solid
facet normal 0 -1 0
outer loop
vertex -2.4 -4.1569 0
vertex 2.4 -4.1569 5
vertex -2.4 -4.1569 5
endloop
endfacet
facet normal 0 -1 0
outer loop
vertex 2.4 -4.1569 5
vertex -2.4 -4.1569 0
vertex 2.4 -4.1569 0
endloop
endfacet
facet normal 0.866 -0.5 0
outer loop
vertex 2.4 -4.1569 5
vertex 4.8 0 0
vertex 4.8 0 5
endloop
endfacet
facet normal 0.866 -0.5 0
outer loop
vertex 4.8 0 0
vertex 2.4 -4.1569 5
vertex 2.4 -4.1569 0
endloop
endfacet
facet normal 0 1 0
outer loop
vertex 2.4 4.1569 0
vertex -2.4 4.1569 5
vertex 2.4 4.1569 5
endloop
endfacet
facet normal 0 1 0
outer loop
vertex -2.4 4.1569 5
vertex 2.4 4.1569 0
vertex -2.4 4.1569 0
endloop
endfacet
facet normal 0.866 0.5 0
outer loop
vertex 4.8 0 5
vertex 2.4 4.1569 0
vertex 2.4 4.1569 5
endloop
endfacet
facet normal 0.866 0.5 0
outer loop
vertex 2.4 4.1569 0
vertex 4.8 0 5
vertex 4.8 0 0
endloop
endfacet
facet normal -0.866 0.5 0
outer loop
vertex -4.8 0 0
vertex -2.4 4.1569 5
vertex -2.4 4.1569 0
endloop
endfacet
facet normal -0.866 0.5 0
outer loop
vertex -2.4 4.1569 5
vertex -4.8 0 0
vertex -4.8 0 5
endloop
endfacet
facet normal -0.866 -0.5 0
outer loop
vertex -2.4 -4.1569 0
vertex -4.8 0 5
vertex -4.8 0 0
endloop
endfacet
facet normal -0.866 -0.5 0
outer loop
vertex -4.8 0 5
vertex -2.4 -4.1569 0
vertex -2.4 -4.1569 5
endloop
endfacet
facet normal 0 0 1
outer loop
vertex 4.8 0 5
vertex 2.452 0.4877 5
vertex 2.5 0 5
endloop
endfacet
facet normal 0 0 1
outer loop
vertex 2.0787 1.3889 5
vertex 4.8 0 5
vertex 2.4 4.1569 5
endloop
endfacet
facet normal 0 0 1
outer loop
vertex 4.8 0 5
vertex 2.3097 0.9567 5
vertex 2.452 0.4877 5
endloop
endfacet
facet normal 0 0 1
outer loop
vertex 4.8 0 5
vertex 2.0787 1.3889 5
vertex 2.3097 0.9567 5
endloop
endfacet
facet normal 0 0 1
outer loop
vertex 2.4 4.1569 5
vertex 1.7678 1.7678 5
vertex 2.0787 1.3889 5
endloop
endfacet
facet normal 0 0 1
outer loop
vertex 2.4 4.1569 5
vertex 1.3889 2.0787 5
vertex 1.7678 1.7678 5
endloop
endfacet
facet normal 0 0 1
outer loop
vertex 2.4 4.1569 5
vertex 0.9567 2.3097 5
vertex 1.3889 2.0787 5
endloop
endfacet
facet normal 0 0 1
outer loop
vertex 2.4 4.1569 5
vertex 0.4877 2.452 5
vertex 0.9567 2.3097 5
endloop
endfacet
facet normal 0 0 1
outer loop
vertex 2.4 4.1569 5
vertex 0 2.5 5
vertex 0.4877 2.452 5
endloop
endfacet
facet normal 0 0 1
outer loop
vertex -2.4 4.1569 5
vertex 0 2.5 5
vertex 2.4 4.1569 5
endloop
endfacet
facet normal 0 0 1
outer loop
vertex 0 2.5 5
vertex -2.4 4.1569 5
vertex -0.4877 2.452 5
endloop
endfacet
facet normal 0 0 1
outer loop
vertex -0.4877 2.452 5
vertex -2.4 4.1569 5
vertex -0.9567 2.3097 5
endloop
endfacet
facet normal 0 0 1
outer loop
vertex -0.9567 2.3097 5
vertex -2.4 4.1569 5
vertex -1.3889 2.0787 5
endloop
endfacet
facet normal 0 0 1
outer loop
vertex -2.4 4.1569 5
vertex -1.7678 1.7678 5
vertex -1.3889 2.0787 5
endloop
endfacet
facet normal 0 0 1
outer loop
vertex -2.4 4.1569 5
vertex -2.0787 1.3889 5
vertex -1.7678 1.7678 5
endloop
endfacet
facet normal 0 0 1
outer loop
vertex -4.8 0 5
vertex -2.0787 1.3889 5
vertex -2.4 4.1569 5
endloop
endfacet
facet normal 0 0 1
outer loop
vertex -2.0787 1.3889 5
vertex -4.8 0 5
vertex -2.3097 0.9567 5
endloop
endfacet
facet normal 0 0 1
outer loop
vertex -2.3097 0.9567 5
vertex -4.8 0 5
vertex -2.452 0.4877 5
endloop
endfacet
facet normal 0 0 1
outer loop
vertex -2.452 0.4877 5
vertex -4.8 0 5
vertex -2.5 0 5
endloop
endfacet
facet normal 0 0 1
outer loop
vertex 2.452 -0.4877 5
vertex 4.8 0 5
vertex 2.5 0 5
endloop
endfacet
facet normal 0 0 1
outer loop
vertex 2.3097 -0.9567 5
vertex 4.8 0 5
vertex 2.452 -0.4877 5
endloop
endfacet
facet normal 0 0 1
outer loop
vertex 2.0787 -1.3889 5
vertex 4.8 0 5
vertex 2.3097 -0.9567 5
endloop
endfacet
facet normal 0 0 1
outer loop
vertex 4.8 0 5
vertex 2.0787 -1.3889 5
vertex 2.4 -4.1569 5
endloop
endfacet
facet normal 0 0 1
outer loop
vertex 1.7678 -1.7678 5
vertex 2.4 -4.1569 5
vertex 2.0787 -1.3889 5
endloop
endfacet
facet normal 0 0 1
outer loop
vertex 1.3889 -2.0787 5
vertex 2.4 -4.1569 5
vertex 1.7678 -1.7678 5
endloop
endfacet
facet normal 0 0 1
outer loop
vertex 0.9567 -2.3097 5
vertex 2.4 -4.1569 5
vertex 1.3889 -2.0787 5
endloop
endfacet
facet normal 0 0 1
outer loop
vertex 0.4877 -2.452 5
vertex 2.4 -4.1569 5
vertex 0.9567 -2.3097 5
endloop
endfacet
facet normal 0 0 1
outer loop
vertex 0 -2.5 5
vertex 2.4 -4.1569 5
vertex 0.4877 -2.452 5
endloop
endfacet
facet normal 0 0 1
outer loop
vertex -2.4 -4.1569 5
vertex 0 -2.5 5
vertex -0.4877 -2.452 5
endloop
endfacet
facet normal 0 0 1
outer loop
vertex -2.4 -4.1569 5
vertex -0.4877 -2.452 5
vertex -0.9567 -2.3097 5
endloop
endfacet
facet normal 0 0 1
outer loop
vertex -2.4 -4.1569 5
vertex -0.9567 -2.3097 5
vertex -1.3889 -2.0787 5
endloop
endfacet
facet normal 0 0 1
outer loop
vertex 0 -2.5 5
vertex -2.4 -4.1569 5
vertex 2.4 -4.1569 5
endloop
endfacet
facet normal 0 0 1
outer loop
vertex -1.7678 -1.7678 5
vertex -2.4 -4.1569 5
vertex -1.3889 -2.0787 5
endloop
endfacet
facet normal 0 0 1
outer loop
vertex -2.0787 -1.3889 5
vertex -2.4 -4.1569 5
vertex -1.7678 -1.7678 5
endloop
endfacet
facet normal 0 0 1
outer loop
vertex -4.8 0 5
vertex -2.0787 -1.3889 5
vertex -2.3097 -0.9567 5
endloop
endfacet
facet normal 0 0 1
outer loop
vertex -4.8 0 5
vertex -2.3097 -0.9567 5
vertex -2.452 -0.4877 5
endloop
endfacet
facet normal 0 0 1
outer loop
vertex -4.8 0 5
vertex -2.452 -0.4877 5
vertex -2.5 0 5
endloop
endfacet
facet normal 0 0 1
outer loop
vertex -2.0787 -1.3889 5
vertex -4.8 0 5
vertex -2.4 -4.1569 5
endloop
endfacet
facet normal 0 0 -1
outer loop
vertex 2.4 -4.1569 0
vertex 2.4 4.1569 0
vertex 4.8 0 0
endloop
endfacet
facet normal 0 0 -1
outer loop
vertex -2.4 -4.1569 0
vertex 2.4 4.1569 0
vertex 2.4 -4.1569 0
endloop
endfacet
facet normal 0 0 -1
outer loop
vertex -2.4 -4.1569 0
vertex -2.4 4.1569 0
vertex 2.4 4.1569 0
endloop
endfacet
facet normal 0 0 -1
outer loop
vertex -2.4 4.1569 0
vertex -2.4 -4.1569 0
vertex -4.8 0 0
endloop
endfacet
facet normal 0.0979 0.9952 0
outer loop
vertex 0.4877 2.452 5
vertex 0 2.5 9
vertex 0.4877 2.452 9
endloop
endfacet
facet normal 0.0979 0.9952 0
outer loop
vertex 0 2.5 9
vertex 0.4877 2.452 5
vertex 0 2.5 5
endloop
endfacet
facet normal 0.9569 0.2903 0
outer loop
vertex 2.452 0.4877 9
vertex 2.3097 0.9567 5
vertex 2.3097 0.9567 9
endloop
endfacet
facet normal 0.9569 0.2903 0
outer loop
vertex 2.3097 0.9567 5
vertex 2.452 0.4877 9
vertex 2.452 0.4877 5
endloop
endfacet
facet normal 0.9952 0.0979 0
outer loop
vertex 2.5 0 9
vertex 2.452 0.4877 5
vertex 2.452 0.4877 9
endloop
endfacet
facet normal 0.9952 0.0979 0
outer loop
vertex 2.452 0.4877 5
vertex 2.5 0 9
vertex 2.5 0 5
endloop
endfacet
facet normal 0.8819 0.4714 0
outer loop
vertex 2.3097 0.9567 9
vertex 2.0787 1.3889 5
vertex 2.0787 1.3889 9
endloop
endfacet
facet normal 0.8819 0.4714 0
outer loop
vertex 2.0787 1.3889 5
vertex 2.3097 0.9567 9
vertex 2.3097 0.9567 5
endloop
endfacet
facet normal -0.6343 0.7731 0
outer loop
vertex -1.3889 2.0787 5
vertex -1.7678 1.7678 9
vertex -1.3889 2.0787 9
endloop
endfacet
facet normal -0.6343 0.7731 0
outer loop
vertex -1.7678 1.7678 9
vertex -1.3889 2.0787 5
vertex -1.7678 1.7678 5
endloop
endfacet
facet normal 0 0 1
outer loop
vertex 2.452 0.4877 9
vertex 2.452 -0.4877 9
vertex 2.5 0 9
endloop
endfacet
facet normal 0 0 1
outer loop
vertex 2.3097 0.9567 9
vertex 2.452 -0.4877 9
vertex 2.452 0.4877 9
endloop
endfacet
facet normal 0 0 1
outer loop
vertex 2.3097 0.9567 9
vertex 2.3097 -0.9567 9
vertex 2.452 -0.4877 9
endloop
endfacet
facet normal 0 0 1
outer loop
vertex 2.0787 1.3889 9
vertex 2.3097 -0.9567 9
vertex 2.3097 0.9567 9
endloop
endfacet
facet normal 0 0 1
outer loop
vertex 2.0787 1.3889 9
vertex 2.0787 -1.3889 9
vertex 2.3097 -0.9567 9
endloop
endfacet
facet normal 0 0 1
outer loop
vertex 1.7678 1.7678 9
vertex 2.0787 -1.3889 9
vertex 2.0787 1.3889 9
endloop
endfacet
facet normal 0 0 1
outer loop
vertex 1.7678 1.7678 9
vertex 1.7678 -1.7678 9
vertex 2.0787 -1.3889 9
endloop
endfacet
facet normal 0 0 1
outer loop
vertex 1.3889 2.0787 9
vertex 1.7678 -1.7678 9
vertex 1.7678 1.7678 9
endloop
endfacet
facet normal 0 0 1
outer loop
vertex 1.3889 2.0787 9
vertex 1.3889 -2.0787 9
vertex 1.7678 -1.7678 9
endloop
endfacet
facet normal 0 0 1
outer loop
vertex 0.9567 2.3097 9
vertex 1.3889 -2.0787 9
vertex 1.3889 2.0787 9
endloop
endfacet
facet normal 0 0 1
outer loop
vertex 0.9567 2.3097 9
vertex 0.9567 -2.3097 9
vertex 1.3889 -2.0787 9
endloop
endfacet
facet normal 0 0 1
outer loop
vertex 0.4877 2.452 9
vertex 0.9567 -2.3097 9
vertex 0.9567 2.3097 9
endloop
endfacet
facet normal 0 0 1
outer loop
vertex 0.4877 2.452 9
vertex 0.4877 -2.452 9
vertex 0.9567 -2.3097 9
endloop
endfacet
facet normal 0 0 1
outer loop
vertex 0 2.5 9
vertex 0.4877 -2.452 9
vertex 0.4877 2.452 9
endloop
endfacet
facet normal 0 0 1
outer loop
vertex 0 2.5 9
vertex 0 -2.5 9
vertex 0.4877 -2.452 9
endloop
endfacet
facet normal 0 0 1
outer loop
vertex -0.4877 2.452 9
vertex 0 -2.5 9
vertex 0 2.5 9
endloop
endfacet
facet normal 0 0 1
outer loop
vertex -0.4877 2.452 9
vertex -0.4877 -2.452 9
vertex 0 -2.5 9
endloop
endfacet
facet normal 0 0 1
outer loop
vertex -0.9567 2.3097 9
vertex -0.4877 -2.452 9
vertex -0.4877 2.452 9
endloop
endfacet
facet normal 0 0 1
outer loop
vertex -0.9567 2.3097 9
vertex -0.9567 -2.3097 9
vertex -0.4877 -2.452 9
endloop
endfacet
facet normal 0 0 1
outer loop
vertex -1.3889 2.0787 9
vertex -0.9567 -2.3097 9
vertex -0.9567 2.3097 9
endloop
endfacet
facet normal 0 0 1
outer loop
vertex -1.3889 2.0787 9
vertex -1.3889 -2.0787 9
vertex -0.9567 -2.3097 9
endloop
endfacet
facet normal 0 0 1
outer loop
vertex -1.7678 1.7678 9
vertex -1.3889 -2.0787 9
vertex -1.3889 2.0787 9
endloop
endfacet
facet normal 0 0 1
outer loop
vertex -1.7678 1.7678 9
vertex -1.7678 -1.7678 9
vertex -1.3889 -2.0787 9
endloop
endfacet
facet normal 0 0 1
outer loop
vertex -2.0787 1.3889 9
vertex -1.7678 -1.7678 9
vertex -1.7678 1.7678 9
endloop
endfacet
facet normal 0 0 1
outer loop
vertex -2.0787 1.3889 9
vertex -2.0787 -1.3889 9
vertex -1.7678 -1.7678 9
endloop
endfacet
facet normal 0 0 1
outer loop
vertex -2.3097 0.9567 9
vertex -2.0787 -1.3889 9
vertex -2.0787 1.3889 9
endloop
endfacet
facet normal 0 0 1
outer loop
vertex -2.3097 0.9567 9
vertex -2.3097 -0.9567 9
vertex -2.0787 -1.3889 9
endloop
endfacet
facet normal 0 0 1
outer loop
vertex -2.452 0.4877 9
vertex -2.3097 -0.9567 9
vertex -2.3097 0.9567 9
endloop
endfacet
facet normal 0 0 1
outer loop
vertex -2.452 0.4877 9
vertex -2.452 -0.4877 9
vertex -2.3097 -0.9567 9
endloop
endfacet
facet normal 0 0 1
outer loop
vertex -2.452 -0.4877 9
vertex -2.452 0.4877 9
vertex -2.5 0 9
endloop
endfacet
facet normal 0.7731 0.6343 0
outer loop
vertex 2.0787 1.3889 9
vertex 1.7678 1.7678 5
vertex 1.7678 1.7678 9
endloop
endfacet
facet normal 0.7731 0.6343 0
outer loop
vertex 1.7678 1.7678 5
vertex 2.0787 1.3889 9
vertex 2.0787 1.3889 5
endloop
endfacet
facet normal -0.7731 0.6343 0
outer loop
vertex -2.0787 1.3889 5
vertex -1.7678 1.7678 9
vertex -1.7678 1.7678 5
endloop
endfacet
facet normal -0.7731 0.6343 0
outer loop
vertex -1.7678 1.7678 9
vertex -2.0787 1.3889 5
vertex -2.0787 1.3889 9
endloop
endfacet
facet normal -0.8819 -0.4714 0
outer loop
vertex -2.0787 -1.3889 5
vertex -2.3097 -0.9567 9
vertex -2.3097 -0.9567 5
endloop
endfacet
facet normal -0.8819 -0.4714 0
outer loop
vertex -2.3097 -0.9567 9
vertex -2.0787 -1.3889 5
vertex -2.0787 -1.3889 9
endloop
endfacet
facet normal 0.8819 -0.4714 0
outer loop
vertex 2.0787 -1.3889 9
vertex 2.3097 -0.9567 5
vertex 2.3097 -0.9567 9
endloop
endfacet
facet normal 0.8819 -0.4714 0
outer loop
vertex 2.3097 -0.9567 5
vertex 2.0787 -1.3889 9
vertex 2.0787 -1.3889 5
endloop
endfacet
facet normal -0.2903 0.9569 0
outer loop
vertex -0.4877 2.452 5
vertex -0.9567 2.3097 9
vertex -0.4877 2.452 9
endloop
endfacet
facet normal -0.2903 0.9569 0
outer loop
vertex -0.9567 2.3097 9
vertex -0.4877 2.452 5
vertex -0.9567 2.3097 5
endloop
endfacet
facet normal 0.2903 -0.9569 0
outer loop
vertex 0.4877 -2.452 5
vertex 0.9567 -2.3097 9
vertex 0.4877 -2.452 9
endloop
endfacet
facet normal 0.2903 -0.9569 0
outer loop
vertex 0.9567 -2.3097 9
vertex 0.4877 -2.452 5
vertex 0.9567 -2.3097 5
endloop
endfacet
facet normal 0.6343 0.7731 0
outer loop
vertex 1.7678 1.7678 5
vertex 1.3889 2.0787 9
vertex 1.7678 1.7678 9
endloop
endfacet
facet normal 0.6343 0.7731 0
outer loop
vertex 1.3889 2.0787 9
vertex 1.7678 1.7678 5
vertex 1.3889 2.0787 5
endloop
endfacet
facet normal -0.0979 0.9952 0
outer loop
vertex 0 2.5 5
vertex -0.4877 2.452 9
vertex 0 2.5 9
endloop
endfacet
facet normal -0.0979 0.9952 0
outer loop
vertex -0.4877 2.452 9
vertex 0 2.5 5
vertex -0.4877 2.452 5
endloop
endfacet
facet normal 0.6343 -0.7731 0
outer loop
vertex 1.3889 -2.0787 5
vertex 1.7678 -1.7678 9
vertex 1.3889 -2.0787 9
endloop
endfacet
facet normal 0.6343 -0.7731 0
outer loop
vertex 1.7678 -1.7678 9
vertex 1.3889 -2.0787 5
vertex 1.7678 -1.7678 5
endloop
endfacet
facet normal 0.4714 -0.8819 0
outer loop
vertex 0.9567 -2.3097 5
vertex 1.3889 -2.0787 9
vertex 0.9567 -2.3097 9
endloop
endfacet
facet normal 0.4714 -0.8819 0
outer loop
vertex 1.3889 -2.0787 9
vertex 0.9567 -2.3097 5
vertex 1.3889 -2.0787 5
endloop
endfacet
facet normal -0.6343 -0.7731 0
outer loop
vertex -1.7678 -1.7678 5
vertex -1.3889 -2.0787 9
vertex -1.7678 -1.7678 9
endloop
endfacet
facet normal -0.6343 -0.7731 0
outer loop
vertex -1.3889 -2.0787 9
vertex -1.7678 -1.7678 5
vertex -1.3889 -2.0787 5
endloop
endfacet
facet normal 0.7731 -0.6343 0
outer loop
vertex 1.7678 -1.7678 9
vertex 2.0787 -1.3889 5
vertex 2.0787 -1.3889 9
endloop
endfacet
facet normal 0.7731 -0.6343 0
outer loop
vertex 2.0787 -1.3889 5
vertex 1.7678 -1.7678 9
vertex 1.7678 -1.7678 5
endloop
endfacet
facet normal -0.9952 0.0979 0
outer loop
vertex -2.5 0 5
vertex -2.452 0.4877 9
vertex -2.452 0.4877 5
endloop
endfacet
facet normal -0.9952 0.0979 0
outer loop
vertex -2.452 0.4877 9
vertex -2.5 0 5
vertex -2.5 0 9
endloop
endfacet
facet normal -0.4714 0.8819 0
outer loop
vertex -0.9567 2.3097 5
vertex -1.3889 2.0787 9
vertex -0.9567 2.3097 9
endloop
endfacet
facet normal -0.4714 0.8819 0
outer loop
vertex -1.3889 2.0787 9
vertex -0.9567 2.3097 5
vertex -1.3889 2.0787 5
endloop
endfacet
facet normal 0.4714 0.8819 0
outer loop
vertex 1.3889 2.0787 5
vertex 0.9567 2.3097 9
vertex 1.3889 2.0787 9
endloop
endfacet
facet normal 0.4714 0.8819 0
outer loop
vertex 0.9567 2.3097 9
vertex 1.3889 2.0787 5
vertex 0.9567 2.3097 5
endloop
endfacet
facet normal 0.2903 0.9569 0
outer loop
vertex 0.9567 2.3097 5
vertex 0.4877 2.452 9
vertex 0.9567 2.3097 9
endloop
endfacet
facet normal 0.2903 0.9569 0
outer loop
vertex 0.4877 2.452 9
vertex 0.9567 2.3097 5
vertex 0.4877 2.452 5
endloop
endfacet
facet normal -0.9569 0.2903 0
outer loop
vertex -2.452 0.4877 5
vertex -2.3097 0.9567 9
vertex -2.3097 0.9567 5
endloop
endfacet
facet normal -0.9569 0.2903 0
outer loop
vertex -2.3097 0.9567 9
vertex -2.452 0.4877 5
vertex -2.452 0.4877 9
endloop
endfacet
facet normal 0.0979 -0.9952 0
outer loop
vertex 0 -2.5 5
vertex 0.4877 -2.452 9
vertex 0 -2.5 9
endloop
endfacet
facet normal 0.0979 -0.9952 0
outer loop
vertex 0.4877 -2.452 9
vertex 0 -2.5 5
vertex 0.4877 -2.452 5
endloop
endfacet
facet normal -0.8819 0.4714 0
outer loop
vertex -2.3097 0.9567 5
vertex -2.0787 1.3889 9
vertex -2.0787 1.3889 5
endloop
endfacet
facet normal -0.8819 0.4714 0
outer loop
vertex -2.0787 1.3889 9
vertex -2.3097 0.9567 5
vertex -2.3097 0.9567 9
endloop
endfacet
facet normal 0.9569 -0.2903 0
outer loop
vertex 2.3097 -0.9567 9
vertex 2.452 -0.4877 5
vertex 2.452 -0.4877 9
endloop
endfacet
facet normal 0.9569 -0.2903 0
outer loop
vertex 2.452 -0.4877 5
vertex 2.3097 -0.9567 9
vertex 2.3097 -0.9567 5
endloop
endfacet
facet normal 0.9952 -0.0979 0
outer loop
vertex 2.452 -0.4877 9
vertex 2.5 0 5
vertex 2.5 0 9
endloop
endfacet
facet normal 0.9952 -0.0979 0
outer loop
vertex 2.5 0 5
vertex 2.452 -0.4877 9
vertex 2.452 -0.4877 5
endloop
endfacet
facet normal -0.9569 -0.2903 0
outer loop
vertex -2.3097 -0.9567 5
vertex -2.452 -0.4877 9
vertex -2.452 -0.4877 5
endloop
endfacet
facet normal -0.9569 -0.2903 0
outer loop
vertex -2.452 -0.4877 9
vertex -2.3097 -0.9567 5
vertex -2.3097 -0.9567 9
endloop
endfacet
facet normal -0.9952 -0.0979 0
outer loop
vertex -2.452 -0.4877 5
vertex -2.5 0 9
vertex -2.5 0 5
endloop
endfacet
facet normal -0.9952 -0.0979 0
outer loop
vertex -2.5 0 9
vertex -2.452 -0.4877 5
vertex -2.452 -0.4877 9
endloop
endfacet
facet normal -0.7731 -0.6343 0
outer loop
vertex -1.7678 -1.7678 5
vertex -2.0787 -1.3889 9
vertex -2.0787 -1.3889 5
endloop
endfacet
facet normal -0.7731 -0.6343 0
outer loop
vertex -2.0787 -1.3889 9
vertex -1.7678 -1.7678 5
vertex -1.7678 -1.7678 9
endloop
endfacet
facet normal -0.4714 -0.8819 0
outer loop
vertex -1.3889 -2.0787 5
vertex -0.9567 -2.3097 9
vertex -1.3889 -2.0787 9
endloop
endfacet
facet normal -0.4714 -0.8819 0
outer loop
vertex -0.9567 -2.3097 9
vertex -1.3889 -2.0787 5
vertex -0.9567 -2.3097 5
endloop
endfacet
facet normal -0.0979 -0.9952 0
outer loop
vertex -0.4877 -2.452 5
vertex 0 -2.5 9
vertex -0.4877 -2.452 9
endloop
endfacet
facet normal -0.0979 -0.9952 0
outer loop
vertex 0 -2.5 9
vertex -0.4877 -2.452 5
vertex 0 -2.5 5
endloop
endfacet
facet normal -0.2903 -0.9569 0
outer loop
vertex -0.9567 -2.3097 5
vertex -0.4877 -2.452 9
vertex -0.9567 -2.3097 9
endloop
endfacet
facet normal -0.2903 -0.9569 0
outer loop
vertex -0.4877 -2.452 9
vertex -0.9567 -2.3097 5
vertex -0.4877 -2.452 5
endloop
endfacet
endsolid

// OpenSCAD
/**
 * Martin Egli
 * 2022-10-30
 * 12 cm ventilator to suck solder fumes
 */

module vent8cm(col = "Gray", loc_res = 32) {
    distxy = (77.5+65)/2;
    rad_edge = (80-distxy)/2;
    distxy2 = distxy/2;
    hi1 = 11;
    
    color(col) {
        difference() {
            union() {    
                hull() {
                    translate([+distxy2, +distxy2, 0])
                    cylinder(r=rad_edge, h=hi1, $fn = loc_res);
                    translate([+distxy2, -distxy2, 0])
                    cylinder(r=rad_edge, h=hi1, $fn = loc_res);
                    translate([-distxy2, +distxy2, 0])
                    cylinder(r=rad_edge, h=hi1, $fn = loc_res);
                    translate([-distxy2, -distxy2, 0])
                    cylinder(r=rad_edge, h=hi1, $fn = loc_res);
                }
            }
            // M4 holes
            translate([+distxy2, +distxy2, -1])
            cylinder(d=4.5, h=hi1+2, $fn = loc_res);
            translate([+distxy2, -distxy2, -1])
            cylinder(d=4.5, h=hi1+2, $fn = loc_res);
            translate([-distxy2, +distxy2, -1])
            cylinder(d=4.5, h=hi1+2, $fn = loc_res);
            translate([-distxy2, -distxy2, -1])
            cylinder(d=4.5, h=hi1+2, $fn = loc_res);
            
            translate([+distxy2, +distxy2, hi1-2])
            cylinder(d=6.4, h=2+1, $fn = loc_res);
            translate([+distxy2, -distxy2, hi1-2])
            cylinder(d=6.4, h=2+1, $fn = loc_res);
            translate([-distxy2, +distxy2, hi1-2])
            cylinder(d=6.4, h=2+1, $fn = loc_res);
            translate([-distxy2, -distxy2, hi1-2])
            cylinder(d=6.4, h=2+1, $fn = loc_res);
            
            translate([+distxy2, +distxy2, -1])
            cylinder(d=6.4, h=2+1, $fn = loc_res);
            translate([+distxy2, -distxy2, -1])
            cylinder(d=6.4, h=2+1, $fn = loc_res);
            translate([-distxy2, +distxy2, -1])
            cylinder(d=6.4, h=2+1, $fn = loc_res);
            translate([-distxy2, -distxy2, -1])
            cylinder(d=6.4, h=2+1, $fn = loc_res);
            
            // center hole for vent
            translate([0, 0, -1])
            cylinder(d=77, h=hi1+2, $fn = loc_res);
        }
        // vent in the middle, no blades though
        translate([0, 0, 0])
        cylinder(d=30, h=2, $fn = 2*loc_res);
        translate([0, 0, 2.5])
        cylinder(d=30, h=(10.5-2.5), $fn = 2*loc_res);
        
        // vent holder
        r1 = (30-5)/2;
        for(n=[0:1:3]) {
            translate([r1*sin(n*90+45), r1*cos(n*90+45)])
            rotate([0, 0, -45-n*90])
            hull() {
                translate([0, 0, 0])
                cylinder(d = 5, h = 2, $fn = loc_res);
                translate([38, 0, 0])
                cylinder(d = 5, h = 2, $fn = loc_res);
            }
        }
    }
}
*vent8cm();

module vent12cm(col = "Gray", loc_res = 32) {
    distxy = (110+100.5)/2;
    distxy2 = distxy/2;

    color(col) {
        difference() {
            union() {    
                hull() {
                    translate([+distxy2, +distxy2, 0])
                    cylinder(r=7.5, h=25, $fn = loc_res);
                    translate([+distxy2, -distxy2, 0])
                    cylinder(r=7.5, h=25, $fn = loc_res);
                    translate([-distxy2, +distxy2, 0])
                    cylinder(r=7.5, h=25, $fn = loc_res);
                    translate([-distxy2, -distxy2, 0])
                    cylinder(r=7.5, h=25, $fn = loc_res);
                }
            }
            // M4 holes
            translate([+distxy2, +distxy2, -1])
            cylinder(d=4.5, h=25+2, $fn = loc_res);
            translate([+distxy2, -distxy2, -1])
            cylinder(d=4.5, h=25+2, $fn = loc_res);
            translate([-distxy2, +distxy2, -1])
            cylinder(d=4.5, h=25+2, $fn = loc_res);
            translate([-distxy2, -distxy2, -1])
            cylinder(d=4.5, h=25+2, $fn = loc_res);
            // center hole for vent
            translate([0, 0, -1])
            cylinder(d=120-2-2, h=25+2, $fn = loc_res);
        }
        translate([0, 0, 0])
        cylinder(d=40, h=4, $fn = loc_res);
        translate([0, 0, 5])
        cylinder(d=40, h=20, $fn = loc_res);

        r1 = (20-2);
        for(n=[0:1:3]) {
            hull() {
                translate([r1*sin(n*90+45), r1*cos(n*90+45), 0])
                cylinder(d=4, h=4, $fn = loc_res);
                translate([r1*sin(n*90+45)+64*sin(n*90+(45+90)), r1*cos(n*90+45)+64*cos(n*90+(45+90)), 0])
                cylinder(d=4, h=4, $fn = loc_res);
            }
        }
    }
}

module filter8cm(col = "Gray") {
    wid1 = 75;
    color(col)
    translate([-wid1/2, -wid1/2, 0])
    cube([wid1, wid1, 10]);
}
*filter8cm();

module filter(col = "Gray", loc_res = 32) {
    color(col)
    translate([-130/2, -130/2, 0])
    cube([130, 130, 11]);
}

module m5Nut(loc_res = 32) {
    difference() {
        cylinder(d = 9, h = 4, $fn = 6);
        translate([0, 0, -1])
        cylinder(d = 5, h = 6, $fn = loc_res);
    }
}
*m5Nut();

module m5Nut_cut(len = 4+1, loc_res = 32) {
    cylinder(d = 9.6, h = len, $fn = 6);
    cylinder(d = 5, h = len+4, $fn = loc_res);
}
m5Nut_cut();
